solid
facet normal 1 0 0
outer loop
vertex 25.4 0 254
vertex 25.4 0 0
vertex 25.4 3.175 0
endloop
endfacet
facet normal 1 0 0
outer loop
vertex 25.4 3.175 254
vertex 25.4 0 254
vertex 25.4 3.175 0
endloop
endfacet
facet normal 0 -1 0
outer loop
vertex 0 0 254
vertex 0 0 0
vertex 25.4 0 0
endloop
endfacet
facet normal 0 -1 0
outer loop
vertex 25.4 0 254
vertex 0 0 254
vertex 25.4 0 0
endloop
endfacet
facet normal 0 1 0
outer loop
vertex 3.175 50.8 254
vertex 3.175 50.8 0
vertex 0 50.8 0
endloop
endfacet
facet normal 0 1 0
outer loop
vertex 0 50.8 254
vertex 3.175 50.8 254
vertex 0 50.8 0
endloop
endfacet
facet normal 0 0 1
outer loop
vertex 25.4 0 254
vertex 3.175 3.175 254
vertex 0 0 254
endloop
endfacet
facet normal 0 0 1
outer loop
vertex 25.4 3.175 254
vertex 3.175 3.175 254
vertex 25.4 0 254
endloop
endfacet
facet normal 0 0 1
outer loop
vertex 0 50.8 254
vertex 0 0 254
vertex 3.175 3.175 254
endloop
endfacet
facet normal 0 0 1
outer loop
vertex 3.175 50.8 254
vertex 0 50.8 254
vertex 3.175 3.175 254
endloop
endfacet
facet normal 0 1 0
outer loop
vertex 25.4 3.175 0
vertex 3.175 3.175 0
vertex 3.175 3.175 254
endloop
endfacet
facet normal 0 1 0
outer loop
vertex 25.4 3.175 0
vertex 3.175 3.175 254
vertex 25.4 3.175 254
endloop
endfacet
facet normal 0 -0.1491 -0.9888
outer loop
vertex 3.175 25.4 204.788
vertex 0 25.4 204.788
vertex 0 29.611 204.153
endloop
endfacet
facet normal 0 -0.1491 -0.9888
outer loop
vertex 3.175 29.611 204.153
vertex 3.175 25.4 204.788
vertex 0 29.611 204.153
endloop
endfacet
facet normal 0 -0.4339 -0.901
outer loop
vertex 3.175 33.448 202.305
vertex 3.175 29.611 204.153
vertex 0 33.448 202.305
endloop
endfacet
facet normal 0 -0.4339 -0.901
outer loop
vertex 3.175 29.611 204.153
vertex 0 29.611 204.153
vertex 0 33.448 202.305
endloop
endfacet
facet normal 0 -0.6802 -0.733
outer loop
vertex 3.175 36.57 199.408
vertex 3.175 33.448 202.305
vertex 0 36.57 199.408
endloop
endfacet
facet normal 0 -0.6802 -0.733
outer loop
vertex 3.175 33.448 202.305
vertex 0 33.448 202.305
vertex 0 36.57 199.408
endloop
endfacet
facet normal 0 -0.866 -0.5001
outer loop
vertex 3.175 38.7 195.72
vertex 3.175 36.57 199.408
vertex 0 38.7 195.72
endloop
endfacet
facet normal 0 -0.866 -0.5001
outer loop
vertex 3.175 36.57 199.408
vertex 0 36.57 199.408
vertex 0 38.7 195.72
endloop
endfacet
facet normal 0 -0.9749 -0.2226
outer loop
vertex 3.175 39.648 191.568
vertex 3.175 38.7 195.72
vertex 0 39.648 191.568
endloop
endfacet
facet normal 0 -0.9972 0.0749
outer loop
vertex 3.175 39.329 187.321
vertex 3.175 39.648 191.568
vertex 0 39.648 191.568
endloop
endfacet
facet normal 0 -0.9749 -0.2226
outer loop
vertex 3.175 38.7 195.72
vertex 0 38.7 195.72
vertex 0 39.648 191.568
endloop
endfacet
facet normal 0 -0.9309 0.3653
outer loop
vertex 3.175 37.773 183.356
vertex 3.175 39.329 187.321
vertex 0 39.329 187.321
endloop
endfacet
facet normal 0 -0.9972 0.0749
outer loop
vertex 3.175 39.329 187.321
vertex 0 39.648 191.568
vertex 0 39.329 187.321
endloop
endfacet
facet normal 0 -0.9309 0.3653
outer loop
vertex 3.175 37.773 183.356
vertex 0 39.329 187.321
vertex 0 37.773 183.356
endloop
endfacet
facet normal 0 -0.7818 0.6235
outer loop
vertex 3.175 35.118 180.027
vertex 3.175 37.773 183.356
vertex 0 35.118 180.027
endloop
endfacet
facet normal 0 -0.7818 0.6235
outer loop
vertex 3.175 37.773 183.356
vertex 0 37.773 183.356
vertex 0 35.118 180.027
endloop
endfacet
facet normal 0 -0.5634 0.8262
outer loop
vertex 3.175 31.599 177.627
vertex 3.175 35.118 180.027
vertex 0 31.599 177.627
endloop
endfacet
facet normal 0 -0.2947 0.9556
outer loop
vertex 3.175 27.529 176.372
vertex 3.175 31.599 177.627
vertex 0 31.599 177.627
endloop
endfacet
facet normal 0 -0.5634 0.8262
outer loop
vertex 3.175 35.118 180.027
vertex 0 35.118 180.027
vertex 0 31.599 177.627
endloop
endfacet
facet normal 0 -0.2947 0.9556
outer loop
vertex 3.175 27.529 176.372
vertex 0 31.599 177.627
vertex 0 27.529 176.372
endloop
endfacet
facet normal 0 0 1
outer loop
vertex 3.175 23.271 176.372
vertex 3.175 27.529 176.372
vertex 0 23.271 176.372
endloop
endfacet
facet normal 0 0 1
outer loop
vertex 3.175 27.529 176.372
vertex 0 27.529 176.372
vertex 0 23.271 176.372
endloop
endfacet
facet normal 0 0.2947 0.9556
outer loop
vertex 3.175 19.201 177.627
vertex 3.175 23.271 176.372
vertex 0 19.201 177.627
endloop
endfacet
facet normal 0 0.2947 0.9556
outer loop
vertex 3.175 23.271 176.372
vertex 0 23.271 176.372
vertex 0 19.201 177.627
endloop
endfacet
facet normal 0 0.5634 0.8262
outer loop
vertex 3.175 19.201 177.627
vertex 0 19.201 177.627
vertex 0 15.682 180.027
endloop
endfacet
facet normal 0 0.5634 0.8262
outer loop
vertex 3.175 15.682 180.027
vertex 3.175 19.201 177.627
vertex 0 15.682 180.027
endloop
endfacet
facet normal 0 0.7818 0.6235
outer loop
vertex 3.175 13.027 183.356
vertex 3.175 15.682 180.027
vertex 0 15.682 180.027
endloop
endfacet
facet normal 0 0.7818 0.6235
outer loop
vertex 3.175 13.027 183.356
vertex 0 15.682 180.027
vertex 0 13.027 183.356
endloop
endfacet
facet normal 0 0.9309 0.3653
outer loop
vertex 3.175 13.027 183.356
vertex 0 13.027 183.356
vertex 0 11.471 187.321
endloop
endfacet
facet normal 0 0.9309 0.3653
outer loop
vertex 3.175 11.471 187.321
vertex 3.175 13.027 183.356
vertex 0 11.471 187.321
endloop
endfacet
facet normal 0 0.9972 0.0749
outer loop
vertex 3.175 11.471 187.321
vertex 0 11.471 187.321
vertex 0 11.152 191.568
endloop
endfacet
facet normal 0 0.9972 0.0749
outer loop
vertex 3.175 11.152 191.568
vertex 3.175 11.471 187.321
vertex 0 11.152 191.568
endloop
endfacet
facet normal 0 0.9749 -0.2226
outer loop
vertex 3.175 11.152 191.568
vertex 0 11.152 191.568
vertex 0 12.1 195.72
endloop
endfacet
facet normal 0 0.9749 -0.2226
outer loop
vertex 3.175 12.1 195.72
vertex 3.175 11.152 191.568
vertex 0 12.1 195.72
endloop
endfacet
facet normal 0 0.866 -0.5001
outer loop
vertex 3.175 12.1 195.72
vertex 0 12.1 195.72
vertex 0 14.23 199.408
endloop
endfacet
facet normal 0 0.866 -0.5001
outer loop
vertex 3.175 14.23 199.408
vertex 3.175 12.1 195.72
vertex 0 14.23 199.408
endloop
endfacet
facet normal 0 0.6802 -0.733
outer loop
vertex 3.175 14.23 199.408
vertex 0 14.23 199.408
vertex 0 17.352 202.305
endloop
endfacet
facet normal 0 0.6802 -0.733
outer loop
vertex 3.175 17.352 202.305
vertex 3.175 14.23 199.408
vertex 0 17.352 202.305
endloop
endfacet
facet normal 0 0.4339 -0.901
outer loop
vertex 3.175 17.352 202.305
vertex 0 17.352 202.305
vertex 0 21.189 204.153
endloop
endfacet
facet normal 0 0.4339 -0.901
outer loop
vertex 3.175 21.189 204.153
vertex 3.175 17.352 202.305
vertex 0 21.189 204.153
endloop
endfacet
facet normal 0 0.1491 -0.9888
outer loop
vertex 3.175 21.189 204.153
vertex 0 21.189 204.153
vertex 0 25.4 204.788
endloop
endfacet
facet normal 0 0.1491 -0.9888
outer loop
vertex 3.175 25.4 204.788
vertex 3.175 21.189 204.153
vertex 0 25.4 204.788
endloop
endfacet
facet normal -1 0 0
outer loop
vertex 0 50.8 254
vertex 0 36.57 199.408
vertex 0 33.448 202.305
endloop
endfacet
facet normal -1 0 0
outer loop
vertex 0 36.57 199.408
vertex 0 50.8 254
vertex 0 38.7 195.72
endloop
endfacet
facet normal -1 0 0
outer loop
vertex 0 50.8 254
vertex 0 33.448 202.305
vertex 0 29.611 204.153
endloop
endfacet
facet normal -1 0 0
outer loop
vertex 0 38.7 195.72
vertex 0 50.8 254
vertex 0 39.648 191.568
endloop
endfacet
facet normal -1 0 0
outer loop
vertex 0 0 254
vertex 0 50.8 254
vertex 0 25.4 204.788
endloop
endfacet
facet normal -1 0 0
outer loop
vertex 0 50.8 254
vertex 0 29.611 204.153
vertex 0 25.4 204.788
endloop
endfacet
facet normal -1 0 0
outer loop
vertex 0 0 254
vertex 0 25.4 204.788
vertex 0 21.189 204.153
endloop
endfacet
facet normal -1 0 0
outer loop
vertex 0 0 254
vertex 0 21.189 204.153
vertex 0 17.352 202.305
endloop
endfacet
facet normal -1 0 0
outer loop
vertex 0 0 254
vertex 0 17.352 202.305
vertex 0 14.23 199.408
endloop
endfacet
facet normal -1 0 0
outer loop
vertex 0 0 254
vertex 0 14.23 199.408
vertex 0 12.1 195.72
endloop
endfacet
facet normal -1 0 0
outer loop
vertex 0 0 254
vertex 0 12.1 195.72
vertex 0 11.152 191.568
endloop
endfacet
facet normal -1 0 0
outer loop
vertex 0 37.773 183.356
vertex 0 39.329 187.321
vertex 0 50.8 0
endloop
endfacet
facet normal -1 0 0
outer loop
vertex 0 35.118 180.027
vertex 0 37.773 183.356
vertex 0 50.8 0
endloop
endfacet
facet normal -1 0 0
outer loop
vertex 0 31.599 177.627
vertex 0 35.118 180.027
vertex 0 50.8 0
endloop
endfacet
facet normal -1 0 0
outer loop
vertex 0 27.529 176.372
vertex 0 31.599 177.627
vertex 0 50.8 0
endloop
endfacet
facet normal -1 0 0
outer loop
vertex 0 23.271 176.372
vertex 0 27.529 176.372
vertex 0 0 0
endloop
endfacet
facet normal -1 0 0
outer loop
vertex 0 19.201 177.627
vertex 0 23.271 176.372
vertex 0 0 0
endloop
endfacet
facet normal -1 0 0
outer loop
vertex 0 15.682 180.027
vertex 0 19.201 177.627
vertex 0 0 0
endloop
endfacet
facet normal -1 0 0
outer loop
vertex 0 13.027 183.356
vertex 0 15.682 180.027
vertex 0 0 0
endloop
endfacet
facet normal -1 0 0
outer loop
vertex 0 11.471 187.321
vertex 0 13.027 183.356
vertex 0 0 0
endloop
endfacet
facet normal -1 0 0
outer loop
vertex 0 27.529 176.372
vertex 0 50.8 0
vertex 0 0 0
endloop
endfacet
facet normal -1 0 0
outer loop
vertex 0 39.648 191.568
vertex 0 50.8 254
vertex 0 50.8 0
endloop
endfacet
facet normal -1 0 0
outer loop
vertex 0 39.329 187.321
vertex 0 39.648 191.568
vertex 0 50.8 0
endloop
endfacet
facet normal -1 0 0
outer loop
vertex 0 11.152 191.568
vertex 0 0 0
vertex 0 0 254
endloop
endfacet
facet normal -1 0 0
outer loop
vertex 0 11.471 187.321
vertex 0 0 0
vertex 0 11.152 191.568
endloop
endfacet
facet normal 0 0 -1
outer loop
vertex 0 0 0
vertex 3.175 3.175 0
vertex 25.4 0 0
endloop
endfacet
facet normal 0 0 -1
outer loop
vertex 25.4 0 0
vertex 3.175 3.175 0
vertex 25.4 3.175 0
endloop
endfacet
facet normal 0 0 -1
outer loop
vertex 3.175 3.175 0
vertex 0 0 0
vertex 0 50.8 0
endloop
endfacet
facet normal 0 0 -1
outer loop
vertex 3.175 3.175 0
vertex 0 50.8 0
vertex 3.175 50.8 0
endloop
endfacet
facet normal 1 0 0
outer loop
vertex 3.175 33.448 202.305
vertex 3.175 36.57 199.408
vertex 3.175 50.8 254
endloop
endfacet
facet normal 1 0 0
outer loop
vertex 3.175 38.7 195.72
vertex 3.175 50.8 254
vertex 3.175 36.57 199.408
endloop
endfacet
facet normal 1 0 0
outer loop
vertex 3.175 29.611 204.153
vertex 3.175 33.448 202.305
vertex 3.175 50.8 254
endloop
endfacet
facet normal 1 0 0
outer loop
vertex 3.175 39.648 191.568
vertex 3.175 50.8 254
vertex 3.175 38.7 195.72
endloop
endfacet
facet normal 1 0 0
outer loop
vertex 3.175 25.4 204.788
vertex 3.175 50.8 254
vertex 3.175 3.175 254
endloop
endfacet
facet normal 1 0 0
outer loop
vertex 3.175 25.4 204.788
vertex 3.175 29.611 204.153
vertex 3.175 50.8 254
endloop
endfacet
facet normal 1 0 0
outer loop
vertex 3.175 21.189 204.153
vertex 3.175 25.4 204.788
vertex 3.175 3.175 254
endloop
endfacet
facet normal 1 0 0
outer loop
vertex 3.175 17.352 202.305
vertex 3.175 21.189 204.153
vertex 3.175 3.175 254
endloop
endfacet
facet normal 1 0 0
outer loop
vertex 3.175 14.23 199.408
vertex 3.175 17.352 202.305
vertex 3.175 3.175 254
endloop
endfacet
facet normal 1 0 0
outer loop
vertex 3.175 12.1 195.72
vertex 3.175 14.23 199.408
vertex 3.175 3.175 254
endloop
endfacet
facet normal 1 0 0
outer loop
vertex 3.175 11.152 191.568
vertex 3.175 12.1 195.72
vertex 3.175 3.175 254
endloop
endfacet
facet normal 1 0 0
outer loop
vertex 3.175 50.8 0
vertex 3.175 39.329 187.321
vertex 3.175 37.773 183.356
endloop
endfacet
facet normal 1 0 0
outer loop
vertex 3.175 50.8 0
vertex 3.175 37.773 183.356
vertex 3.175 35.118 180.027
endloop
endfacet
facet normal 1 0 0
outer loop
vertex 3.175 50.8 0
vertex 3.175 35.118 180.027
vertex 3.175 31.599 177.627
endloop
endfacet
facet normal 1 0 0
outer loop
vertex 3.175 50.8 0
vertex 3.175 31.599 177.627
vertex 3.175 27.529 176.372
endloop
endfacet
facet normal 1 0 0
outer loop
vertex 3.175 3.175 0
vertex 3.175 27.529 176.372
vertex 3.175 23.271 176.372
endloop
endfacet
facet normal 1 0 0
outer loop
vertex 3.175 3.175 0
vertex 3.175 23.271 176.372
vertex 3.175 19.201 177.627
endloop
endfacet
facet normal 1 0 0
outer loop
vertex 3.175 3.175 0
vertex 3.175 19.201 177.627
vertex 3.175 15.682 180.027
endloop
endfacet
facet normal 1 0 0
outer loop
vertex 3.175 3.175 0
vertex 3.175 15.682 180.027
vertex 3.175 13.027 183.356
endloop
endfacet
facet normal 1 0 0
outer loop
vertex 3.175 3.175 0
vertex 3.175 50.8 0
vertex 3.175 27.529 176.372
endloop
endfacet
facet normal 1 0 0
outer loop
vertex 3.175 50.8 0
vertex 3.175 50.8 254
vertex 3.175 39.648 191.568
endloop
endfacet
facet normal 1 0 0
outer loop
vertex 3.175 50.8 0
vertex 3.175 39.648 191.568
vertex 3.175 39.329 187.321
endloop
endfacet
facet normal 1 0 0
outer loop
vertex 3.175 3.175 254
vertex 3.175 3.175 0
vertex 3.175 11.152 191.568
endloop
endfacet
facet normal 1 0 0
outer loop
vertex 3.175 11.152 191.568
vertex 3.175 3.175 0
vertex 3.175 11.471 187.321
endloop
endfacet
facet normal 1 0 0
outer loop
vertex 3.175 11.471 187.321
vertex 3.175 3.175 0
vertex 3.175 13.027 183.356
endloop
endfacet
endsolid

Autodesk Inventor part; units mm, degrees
ref_plane "YZ Plane" through (0, 0, 0) normal (1, 0, 0) x (0, 1, 0)
ref_plane "XZ Plane" through (0, 0, 0) normal (0, 1, 0) x (-1, 0, 0)
ref_plane "XY Plane" through (0, 0, 0) normal (0, 0, 1) x (1, 0, 0)
sketch "Sketch1" plane through (0, 0, 0) normal (0, 0, 1) x (1, 0, 0)
  line L0 (0, 0) -> (25.4, 0)
  line L1 (25.4, 0) -> (25.4, 3.175)
  line L2 (3.175, 50.8) -> (0, 50.8)
  line L3 (0, 50.8) -> (0, 0)
  line L4 (3.175, 50.8) -> (3.175, 3.175)
  line L5 (3.175, 3.175) -> (25.4, 3.175)
  dimension "d0" = 50.8
  dimension "d1" = 25.4
  dimension "d2" = 3.175
  dimension "d3" = 3.175
extrude "Extrusion1" add sketch "Sketch1" along normal blind 254
sketch "Sketch2" plane through (0, 0, 0) normal (-1, 0, 0) x (0, 0, 1)
  line L0 (0, 0) -> (254, 0) projected
  circle A0 centre (190.5, 25.4) radius 14.2875
  line L1 (254, 0) -> (254, 50.8) projected
  dimension "d6" = 28.575
  dimension "d8" = 25.4
  dimension "d11" = 63.5
extrude "Extrusion2" cut sketch "Sketch2" against normal through all
equation "\"d2\" = d3"
properties part number "8 ball bearing plate left"
